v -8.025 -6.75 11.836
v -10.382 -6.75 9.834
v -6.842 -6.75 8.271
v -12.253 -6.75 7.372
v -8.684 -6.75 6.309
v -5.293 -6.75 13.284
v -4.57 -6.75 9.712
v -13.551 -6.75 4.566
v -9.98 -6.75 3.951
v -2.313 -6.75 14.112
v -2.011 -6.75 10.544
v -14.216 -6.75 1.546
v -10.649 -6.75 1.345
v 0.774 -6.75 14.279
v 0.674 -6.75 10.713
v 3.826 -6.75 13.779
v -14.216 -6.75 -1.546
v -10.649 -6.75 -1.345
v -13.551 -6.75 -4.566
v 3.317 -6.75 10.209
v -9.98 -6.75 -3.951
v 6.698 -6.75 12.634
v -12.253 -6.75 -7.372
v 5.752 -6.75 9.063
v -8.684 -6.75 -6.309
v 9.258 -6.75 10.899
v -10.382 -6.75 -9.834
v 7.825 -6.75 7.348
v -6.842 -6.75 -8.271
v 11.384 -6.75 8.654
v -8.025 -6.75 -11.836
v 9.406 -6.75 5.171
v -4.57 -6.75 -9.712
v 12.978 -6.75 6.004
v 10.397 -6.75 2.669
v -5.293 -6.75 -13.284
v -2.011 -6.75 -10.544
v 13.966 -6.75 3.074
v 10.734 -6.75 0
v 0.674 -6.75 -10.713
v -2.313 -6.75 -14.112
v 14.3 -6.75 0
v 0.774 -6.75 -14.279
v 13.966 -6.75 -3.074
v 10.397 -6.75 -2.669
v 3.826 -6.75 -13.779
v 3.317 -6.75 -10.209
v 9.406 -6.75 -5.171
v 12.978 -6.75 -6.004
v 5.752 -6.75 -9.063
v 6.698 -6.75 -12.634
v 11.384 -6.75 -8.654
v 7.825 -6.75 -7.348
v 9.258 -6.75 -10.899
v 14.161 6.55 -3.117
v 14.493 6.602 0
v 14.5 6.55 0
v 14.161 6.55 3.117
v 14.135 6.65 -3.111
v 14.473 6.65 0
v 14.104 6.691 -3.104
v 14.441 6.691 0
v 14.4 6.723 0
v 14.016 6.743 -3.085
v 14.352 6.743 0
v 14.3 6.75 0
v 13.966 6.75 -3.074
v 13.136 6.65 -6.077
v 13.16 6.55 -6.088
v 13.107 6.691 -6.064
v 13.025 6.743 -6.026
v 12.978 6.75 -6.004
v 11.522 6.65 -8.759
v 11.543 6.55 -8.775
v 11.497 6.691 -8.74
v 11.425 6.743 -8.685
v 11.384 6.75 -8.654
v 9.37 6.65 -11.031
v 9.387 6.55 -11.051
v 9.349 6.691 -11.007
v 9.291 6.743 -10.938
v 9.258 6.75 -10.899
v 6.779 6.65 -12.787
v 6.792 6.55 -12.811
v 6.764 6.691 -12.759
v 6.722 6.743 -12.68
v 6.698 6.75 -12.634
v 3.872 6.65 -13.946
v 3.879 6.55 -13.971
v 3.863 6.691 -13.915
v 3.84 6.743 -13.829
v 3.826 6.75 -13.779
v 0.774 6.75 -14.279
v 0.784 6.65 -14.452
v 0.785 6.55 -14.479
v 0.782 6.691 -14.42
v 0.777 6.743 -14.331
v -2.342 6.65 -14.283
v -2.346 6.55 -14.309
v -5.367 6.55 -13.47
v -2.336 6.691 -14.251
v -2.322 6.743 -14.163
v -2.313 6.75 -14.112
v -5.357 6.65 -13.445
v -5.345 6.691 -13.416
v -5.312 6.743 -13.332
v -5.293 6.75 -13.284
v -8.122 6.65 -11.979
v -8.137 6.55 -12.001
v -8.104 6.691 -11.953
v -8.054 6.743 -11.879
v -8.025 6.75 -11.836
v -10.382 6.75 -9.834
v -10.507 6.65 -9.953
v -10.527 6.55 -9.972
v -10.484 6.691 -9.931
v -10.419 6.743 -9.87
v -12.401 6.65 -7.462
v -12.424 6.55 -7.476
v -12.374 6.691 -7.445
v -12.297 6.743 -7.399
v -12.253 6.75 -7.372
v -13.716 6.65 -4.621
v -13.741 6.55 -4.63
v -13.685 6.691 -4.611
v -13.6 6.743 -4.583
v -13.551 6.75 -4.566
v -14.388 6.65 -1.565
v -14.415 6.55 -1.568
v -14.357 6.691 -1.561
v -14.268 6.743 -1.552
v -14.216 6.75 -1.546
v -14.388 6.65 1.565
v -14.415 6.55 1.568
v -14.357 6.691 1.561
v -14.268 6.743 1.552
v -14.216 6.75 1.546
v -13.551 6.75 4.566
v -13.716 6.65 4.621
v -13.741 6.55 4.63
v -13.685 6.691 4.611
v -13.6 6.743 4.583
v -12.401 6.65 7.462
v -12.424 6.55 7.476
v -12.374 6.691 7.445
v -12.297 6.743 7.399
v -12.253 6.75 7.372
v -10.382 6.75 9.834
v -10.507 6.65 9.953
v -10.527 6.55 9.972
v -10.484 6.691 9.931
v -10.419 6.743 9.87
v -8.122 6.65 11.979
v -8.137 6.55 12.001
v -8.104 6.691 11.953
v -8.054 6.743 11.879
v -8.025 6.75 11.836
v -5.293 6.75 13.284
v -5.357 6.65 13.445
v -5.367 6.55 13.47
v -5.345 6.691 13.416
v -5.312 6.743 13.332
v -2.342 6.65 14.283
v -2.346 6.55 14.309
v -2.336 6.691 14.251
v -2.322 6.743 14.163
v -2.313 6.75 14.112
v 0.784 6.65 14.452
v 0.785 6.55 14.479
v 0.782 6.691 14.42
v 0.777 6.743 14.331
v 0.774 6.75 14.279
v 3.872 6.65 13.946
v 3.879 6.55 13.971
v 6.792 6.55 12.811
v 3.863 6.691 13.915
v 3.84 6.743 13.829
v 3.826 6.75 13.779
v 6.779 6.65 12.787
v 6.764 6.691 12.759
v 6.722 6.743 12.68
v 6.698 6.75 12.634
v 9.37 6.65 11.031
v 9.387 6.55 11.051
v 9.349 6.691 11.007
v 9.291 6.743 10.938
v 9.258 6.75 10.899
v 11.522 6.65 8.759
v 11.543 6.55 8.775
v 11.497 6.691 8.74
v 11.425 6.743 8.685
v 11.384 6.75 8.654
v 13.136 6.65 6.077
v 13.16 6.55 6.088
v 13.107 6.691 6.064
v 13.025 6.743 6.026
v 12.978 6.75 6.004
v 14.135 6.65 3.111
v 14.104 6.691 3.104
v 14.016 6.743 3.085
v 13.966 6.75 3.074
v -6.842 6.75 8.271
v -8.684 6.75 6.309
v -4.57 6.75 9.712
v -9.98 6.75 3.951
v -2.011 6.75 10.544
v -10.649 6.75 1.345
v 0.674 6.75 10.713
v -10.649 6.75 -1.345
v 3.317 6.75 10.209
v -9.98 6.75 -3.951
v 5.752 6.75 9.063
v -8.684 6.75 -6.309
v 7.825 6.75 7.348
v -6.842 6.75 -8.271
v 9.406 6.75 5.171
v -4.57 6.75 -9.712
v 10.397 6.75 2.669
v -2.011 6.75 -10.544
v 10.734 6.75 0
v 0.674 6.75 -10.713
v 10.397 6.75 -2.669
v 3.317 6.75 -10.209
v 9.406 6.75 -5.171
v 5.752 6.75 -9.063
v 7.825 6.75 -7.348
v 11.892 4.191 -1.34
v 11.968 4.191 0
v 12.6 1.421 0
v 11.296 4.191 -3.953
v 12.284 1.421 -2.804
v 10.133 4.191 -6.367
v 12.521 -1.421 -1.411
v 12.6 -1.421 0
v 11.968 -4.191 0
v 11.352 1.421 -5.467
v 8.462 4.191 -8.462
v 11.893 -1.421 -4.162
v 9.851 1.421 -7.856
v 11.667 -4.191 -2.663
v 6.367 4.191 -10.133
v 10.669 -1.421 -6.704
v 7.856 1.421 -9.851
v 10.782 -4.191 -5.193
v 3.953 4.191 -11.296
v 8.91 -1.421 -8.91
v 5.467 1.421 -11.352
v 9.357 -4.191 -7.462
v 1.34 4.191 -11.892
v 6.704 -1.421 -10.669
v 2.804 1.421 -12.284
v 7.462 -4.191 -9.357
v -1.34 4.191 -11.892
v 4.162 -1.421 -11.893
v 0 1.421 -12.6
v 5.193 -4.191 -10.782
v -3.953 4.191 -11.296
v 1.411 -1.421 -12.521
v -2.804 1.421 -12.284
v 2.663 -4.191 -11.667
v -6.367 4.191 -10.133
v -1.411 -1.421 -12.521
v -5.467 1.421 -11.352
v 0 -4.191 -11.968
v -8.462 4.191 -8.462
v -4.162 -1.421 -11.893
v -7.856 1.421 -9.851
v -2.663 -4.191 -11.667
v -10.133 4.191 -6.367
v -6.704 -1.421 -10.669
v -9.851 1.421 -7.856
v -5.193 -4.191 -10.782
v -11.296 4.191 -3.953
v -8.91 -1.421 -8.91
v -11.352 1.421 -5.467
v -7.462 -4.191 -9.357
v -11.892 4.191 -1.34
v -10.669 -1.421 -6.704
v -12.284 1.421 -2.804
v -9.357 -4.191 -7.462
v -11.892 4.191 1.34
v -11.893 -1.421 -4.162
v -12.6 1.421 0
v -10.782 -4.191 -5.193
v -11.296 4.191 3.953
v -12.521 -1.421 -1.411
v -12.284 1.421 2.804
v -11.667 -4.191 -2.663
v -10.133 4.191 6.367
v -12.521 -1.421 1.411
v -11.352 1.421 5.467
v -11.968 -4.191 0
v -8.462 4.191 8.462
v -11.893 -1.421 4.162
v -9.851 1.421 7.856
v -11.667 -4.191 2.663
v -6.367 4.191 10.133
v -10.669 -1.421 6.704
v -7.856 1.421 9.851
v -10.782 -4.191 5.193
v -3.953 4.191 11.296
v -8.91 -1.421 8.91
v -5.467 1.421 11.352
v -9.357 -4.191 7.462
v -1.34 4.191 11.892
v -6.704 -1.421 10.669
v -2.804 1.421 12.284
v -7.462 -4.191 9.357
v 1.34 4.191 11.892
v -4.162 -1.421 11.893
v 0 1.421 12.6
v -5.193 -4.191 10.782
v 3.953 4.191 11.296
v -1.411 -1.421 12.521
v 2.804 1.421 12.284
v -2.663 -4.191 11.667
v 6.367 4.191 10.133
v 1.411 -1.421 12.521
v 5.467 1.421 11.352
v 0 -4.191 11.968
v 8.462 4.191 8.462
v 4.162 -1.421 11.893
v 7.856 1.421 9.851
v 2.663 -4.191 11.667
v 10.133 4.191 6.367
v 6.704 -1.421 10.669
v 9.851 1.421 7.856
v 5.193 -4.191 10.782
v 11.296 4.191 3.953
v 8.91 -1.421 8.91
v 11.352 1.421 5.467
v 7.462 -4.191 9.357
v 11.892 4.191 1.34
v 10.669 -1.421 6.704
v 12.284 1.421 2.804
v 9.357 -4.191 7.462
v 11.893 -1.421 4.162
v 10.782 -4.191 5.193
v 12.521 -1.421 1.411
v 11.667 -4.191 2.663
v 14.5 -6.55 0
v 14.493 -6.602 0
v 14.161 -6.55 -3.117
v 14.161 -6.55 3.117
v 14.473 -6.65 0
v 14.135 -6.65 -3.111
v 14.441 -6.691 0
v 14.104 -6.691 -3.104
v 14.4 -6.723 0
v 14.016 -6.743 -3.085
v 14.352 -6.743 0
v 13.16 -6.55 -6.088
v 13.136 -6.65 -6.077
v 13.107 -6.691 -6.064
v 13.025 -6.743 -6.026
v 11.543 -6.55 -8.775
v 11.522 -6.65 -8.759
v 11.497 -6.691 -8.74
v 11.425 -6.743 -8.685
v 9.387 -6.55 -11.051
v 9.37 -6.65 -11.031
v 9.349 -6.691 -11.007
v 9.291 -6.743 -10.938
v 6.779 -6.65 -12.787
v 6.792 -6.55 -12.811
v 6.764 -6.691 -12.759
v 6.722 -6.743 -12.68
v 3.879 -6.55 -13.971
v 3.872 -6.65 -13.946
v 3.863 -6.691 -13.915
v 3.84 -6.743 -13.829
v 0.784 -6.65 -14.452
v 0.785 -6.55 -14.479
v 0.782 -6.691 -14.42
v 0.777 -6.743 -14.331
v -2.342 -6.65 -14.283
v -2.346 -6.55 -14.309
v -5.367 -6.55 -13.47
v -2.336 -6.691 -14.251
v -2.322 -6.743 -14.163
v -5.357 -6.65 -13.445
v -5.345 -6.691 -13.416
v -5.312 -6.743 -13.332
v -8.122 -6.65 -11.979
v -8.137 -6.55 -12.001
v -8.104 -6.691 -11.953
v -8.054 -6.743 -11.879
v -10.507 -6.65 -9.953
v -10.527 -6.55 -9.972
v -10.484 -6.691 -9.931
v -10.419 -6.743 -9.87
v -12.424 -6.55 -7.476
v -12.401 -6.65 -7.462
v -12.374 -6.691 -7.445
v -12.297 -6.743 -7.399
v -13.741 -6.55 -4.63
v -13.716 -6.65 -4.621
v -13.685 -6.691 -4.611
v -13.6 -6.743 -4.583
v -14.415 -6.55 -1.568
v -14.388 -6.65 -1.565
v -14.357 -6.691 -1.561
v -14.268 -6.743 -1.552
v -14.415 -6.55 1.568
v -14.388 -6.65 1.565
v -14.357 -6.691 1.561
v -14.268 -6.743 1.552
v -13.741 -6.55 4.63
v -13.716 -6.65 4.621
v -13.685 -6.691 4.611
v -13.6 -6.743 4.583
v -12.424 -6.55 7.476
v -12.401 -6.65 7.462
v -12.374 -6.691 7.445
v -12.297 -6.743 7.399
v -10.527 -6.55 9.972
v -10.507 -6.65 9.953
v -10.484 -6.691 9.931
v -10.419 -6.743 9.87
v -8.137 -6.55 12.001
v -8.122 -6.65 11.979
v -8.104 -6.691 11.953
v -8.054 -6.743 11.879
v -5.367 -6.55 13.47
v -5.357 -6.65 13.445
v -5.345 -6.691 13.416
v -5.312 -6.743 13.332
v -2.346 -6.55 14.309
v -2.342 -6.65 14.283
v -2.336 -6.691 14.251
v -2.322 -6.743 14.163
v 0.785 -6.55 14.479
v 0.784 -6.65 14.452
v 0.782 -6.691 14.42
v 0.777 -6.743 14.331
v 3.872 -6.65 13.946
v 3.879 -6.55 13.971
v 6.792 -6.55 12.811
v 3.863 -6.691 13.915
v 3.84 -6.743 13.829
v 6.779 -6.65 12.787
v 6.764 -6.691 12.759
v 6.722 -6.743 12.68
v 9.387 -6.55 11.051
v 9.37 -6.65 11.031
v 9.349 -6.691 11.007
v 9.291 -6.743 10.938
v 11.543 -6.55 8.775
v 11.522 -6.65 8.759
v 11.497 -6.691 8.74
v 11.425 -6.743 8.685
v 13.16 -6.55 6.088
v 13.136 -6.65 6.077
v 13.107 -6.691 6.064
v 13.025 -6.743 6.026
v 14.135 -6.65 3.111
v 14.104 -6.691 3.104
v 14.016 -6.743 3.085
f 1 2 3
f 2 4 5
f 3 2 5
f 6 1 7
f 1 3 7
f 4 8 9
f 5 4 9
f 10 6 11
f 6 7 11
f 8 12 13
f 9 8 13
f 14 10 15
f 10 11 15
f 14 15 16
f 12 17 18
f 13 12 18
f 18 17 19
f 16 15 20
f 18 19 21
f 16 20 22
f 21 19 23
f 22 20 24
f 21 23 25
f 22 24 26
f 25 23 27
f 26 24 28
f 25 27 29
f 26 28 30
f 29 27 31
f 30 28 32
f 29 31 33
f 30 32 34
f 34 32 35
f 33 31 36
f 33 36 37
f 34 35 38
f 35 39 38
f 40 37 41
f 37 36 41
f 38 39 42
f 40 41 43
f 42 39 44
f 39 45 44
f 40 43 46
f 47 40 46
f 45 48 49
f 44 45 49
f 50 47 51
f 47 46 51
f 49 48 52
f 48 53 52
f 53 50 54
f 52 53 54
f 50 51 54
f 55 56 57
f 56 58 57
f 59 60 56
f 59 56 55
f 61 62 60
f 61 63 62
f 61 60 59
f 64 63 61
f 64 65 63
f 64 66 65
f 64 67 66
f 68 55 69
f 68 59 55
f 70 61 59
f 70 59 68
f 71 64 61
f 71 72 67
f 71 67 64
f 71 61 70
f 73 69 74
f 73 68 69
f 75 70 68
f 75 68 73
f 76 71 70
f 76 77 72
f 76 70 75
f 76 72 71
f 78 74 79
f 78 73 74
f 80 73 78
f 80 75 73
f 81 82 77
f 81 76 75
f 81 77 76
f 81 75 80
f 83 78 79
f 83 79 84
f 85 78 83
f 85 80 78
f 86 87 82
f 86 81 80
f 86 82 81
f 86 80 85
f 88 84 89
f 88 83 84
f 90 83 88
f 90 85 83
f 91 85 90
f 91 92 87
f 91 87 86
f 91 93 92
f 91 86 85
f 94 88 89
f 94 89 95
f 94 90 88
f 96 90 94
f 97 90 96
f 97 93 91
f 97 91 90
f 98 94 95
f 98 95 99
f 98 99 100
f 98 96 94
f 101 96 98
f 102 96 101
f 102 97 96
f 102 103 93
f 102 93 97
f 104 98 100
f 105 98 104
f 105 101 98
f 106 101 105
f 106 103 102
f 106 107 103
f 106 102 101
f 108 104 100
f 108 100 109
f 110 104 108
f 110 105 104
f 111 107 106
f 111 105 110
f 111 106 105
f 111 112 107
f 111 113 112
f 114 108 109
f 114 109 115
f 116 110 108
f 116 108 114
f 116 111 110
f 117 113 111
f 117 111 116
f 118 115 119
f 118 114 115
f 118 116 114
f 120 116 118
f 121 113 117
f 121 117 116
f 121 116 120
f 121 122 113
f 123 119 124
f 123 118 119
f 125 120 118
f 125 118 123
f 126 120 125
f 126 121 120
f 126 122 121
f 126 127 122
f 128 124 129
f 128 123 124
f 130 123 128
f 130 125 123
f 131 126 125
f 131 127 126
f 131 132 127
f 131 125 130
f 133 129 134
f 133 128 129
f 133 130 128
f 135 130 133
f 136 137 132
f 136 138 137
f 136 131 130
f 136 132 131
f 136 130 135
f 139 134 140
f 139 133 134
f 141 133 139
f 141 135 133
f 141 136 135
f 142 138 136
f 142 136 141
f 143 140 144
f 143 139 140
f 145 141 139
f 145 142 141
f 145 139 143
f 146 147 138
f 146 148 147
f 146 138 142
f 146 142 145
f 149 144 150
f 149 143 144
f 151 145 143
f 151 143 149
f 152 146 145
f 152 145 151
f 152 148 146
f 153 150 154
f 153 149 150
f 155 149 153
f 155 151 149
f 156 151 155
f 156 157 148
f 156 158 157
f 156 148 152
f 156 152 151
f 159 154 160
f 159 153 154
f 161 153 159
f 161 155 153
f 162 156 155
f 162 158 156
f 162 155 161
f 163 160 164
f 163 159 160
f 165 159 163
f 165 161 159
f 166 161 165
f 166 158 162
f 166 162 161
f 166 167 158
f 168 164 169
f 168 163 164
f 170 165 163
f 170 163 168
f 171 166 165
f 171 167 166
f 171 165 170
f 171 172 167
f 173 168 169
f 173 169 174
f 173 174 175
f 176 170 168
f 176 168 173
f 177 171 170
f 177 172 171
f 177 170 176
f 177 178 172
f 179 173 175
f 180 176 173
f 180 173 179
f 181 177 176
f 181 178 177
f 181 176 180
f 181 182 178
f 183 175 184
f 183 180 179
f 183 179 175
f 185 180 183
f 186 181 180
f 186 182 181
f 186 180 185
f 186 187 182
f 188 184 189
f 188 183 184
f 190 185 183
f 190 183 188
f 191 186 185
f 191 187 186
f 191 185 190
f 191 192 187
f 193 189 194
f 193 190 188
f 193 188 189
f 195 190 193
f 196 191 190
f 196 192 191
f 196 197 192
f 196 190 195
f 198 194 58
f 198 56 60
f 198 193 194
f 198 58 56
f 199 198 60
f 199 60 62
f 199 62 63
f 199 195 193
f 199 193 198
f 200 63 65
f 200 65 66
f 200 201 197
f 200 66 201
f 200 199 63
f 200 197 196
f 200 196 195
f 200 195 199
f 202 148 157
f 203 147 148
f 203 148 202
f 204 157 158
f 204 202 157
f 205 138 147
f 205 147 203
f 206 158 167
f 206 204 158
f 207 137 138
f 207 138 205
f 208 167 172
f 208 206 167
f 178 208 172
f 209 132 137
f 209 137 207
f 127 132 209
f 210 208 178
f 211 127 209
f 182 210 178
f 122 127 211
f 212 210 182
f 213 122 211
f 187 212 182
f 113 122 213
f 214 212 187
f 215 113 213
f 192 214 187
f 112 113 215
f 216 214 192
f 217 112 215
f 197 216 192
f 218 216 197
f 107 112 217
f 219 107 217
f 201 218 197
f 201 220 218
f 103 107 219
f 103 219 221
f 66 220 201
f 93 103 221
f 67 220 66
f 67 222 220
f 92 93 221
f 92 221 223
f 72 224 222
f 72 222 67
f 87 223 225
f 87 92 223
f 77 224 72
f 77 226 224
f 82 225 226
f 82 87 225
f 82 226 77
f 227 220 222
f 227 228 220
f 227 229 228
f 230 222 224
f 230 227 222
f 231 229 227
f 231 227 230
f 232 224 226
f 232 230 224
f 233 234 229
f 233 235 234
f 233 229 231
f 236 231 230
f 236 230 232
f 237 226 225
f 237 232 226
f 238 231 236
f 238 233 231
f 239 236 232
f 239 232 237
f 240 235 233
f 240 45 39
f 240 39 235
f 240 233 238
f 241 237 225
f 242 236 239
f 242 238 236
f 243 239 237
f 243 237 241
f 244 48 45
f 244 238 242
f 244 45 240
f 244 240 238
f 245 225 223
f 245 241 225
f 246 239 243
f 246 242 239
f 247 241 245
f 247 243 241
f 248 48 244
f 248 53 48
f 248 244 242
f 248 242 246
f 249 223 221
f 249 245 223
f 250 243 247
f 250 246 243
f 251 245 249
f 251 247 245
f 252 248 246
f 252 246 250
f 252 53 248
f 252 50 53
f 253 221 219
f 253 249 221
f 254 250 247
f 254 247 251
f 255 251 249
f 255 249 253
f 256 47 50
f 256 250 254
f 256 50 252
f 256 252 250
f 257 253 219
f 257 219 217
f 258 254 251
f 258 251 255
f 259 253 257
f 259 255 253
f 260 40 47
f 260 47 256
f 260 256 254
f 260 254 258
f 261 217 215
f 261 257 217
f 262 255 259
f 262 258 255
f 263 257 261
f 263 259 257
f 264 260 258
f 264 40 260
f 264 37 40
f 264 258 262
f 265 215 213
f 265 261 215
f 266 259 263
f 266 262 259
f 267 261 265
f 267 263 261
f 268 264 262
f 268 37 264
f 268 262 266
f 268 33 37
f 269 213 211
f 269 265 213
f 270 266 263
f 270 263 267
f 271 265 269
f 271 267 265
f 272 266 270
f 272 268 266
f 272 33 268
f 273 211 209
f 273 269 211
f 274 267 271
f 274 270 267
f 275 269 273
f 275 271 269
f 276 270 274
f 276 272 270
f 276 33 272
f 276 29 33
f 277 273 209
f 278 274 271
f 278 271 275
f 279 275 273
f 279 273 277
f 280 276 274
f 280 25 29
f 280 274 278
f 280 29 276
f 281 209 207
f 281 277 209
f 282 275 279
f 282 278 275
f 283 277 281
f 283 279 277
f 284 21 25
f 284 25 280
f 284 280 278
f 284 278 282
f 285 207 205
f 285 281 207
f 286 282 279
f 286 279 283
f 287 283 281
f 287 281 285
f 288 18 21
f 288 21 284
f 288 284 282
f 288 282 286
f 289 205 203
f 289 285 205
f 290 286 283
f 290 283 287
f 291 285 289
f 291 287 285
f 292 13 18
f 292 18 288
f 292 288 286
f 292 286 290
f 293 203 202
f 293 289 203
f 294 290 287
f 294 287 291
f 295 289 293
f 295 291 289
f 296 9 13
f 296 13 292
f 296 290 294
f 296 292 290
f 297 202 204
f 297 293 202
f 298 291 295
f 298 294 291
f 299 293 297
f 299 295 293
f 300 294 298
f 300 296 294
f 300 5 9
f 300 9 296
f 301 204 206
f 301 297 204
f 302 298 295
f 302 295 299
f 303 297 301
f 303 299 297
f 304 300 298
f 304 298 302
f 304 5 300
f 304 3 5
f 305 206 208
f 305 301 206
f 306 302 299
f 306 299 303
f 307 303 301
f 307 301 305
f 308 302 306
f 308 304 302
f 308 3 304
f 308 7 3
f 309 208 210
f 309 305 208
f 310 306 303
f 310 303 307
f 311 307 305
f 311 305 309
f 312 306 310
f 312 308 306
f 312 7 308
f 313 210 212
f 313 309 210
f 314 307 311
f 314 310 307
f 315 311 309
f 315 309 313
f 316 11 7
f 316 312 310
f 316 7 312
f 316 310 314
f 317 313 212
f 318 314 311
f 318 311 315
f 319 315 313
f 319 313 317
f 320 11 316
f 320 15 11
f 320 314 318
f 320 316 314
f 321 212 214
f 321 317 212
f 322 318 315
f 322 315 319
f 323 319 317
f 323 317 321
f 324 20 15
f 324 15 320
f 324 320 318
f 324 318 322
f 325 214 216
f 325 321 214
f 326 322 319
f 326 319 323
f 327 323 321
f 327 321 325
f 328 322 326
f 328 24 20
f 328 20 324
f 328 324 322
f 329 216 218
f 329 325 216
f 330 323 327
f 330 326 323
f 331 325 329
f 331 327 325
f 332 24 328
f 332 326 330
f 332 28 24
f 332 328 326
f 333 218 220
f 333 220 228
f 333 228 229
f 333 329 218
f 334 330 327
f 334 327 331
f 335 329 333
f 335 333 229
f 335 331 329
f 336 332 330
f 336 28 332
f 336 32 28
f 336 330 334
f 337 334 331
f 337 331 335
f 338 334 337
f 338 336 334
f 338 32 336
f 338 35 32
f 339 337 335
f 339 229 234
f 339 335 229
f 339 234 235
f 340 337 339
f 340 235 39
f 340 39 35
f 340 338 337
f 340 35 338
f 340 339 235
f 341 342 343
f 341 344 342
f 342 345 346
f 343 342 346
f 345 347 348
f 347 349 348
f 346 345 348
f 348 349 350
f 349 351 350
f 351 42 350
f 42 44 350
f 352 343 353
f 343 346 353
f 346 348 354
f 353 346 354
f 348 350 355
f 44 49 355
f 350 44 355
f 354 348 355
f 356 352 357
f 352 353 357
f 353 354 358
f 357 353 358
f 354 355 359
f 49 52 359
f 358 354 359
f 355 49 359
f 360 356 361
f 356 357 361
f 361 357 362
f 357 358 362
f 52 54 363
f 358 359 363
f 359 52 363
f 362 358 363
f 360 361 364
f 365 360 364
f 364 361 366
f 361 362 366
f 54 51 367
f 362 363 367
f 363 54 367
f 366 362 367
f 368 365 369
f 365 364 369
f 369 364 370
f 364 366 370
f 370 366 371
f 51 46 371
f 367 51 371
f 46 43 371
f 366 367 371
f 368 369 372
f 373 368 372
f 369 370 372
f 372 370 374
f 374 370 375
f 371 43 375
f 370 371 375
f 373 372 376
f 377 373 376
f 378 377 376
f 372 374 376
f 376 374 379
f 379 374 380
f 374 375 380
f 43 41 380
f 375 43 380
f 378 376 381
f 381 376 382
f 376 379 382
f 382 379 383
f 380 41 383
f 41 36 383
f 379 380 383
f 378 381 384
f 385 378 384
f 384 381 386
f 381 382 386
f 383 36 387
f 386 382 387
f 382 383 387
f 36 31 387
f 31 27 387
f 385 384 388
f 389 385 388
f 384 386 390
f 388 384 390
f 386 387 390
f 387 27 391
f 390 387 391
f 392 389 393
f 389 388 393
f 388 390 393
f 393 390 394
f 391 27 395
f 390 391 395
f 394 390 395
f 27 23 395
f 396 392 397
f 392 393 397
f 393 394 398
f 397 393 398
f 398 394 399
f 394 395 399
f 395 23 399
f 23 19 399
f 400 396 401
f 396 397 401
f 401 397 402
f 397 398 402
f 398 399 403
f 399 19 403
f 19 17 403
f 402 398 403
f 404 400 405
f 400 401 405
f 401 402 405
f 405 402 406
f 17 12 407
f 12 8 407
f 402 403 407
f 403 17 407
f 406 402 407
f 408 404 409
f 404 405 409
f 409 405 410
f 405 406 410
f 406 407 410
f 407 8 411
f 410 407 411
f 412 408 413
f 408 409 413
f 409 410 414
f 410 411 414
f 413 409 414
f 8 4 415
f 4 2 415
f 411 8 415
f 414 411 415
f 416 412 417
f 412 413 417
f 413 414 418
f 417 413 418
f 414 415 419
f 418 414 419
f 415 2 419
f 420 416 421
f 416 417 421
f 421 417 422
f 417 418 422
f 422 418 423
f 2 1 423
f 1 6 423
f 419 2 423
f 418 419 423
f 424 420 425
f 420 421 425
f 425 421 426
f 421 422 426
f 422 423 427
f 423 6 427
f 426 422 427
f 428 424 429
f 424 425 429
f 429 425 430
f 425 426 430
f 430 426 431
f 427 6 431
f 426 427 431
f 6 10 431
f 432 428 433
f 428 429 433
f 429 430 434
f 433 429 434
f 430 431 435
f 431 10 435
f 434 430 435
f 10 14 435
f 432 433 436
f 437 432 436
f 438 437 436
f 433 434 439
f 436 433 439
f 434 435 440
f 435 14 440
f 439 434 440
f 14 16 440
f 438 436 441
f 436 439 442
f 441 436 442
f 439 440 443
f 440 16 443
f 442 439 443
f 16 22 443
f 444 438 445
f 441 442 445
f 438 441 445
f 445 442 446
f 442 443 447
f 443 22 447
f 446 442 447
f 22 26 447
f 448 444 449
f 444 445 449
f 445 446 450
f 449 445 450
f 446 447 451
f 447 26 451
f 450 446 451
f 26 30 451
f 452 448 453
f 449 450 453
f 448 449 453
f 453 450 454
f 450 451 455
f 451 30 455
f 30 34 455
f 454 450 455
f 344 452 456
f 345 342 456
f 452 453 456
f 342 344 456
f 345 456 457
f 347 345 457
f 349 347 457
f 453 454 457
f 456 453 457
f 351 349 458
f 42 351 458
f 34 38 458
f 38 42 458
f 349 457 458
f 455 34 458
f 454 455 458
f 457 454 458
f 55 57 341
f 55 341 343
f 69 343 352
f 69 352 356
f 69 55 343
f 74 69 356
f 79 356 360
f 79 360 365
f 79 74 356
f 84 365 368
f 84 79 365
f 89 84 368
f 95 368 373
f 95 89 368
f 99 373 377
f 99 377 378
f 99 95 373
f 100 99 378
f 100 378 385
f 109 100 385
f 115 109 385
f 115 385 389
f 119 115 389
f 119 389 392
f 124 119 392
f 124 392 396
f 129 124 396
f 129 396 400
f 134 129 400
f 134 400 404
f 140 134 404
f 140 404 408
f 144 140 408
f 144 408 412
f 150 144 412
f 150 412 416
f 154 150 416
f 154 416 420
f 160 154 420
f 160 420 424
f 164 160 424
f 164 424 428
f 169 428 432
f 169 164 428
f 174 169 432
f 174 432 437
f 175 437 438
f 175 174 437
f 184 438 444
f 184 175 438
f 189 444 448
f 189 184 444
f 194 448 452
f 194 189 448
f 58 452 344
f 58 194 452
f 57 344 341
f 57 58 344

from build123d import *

# Parameters (mm, degrees)
SZKIC1_R                    = 14.5
DODANIE_WYCI_GNI_CIE1_DEPTH = 6.75
ZAOKR_GLENIE1_R             = 0.2


with BuildPart() as part:
    # Szkic1 → Dodanie-wyciągnięcie1 (new body, symmetric)
    with BuildSketch(Plane(origin=(0, 0, 0), x_dir=(1, 0, 0), z_dir=(0, 1, 0))):
        Circle(SZKIC1_R)
    extrude(amount=DODANIE_WYCI_GNI_CIE1_DEPTH, both=True)

    # Szkic3 → Wycięcie-obrót1 (revolve, cut)
    with BuildSketch(Plane.XY):
        with BuildLine():
            Line((0, -12.68), (0, 12.68))
            ThreePointArc((0, 12.68), (12.68, 0), (0, -12.68))
        make_face()
    revolve(axis=Axis((0, -12.68, 0), (0, 1, 0)), mode=Mode.SUBTRACT)

    # Zaokrąglenie1
    zaokr_glenie1_edges = [part.edges().sort_by_distance(p)[0] for p in [
        (-14.5, -6.75, 0),
        (-14.5, 6.75, 0),
    ]]
    fillet(zaokr_glenie1_edges, radius=ZAOKR_GLENIE1_R)


solid = part.part
